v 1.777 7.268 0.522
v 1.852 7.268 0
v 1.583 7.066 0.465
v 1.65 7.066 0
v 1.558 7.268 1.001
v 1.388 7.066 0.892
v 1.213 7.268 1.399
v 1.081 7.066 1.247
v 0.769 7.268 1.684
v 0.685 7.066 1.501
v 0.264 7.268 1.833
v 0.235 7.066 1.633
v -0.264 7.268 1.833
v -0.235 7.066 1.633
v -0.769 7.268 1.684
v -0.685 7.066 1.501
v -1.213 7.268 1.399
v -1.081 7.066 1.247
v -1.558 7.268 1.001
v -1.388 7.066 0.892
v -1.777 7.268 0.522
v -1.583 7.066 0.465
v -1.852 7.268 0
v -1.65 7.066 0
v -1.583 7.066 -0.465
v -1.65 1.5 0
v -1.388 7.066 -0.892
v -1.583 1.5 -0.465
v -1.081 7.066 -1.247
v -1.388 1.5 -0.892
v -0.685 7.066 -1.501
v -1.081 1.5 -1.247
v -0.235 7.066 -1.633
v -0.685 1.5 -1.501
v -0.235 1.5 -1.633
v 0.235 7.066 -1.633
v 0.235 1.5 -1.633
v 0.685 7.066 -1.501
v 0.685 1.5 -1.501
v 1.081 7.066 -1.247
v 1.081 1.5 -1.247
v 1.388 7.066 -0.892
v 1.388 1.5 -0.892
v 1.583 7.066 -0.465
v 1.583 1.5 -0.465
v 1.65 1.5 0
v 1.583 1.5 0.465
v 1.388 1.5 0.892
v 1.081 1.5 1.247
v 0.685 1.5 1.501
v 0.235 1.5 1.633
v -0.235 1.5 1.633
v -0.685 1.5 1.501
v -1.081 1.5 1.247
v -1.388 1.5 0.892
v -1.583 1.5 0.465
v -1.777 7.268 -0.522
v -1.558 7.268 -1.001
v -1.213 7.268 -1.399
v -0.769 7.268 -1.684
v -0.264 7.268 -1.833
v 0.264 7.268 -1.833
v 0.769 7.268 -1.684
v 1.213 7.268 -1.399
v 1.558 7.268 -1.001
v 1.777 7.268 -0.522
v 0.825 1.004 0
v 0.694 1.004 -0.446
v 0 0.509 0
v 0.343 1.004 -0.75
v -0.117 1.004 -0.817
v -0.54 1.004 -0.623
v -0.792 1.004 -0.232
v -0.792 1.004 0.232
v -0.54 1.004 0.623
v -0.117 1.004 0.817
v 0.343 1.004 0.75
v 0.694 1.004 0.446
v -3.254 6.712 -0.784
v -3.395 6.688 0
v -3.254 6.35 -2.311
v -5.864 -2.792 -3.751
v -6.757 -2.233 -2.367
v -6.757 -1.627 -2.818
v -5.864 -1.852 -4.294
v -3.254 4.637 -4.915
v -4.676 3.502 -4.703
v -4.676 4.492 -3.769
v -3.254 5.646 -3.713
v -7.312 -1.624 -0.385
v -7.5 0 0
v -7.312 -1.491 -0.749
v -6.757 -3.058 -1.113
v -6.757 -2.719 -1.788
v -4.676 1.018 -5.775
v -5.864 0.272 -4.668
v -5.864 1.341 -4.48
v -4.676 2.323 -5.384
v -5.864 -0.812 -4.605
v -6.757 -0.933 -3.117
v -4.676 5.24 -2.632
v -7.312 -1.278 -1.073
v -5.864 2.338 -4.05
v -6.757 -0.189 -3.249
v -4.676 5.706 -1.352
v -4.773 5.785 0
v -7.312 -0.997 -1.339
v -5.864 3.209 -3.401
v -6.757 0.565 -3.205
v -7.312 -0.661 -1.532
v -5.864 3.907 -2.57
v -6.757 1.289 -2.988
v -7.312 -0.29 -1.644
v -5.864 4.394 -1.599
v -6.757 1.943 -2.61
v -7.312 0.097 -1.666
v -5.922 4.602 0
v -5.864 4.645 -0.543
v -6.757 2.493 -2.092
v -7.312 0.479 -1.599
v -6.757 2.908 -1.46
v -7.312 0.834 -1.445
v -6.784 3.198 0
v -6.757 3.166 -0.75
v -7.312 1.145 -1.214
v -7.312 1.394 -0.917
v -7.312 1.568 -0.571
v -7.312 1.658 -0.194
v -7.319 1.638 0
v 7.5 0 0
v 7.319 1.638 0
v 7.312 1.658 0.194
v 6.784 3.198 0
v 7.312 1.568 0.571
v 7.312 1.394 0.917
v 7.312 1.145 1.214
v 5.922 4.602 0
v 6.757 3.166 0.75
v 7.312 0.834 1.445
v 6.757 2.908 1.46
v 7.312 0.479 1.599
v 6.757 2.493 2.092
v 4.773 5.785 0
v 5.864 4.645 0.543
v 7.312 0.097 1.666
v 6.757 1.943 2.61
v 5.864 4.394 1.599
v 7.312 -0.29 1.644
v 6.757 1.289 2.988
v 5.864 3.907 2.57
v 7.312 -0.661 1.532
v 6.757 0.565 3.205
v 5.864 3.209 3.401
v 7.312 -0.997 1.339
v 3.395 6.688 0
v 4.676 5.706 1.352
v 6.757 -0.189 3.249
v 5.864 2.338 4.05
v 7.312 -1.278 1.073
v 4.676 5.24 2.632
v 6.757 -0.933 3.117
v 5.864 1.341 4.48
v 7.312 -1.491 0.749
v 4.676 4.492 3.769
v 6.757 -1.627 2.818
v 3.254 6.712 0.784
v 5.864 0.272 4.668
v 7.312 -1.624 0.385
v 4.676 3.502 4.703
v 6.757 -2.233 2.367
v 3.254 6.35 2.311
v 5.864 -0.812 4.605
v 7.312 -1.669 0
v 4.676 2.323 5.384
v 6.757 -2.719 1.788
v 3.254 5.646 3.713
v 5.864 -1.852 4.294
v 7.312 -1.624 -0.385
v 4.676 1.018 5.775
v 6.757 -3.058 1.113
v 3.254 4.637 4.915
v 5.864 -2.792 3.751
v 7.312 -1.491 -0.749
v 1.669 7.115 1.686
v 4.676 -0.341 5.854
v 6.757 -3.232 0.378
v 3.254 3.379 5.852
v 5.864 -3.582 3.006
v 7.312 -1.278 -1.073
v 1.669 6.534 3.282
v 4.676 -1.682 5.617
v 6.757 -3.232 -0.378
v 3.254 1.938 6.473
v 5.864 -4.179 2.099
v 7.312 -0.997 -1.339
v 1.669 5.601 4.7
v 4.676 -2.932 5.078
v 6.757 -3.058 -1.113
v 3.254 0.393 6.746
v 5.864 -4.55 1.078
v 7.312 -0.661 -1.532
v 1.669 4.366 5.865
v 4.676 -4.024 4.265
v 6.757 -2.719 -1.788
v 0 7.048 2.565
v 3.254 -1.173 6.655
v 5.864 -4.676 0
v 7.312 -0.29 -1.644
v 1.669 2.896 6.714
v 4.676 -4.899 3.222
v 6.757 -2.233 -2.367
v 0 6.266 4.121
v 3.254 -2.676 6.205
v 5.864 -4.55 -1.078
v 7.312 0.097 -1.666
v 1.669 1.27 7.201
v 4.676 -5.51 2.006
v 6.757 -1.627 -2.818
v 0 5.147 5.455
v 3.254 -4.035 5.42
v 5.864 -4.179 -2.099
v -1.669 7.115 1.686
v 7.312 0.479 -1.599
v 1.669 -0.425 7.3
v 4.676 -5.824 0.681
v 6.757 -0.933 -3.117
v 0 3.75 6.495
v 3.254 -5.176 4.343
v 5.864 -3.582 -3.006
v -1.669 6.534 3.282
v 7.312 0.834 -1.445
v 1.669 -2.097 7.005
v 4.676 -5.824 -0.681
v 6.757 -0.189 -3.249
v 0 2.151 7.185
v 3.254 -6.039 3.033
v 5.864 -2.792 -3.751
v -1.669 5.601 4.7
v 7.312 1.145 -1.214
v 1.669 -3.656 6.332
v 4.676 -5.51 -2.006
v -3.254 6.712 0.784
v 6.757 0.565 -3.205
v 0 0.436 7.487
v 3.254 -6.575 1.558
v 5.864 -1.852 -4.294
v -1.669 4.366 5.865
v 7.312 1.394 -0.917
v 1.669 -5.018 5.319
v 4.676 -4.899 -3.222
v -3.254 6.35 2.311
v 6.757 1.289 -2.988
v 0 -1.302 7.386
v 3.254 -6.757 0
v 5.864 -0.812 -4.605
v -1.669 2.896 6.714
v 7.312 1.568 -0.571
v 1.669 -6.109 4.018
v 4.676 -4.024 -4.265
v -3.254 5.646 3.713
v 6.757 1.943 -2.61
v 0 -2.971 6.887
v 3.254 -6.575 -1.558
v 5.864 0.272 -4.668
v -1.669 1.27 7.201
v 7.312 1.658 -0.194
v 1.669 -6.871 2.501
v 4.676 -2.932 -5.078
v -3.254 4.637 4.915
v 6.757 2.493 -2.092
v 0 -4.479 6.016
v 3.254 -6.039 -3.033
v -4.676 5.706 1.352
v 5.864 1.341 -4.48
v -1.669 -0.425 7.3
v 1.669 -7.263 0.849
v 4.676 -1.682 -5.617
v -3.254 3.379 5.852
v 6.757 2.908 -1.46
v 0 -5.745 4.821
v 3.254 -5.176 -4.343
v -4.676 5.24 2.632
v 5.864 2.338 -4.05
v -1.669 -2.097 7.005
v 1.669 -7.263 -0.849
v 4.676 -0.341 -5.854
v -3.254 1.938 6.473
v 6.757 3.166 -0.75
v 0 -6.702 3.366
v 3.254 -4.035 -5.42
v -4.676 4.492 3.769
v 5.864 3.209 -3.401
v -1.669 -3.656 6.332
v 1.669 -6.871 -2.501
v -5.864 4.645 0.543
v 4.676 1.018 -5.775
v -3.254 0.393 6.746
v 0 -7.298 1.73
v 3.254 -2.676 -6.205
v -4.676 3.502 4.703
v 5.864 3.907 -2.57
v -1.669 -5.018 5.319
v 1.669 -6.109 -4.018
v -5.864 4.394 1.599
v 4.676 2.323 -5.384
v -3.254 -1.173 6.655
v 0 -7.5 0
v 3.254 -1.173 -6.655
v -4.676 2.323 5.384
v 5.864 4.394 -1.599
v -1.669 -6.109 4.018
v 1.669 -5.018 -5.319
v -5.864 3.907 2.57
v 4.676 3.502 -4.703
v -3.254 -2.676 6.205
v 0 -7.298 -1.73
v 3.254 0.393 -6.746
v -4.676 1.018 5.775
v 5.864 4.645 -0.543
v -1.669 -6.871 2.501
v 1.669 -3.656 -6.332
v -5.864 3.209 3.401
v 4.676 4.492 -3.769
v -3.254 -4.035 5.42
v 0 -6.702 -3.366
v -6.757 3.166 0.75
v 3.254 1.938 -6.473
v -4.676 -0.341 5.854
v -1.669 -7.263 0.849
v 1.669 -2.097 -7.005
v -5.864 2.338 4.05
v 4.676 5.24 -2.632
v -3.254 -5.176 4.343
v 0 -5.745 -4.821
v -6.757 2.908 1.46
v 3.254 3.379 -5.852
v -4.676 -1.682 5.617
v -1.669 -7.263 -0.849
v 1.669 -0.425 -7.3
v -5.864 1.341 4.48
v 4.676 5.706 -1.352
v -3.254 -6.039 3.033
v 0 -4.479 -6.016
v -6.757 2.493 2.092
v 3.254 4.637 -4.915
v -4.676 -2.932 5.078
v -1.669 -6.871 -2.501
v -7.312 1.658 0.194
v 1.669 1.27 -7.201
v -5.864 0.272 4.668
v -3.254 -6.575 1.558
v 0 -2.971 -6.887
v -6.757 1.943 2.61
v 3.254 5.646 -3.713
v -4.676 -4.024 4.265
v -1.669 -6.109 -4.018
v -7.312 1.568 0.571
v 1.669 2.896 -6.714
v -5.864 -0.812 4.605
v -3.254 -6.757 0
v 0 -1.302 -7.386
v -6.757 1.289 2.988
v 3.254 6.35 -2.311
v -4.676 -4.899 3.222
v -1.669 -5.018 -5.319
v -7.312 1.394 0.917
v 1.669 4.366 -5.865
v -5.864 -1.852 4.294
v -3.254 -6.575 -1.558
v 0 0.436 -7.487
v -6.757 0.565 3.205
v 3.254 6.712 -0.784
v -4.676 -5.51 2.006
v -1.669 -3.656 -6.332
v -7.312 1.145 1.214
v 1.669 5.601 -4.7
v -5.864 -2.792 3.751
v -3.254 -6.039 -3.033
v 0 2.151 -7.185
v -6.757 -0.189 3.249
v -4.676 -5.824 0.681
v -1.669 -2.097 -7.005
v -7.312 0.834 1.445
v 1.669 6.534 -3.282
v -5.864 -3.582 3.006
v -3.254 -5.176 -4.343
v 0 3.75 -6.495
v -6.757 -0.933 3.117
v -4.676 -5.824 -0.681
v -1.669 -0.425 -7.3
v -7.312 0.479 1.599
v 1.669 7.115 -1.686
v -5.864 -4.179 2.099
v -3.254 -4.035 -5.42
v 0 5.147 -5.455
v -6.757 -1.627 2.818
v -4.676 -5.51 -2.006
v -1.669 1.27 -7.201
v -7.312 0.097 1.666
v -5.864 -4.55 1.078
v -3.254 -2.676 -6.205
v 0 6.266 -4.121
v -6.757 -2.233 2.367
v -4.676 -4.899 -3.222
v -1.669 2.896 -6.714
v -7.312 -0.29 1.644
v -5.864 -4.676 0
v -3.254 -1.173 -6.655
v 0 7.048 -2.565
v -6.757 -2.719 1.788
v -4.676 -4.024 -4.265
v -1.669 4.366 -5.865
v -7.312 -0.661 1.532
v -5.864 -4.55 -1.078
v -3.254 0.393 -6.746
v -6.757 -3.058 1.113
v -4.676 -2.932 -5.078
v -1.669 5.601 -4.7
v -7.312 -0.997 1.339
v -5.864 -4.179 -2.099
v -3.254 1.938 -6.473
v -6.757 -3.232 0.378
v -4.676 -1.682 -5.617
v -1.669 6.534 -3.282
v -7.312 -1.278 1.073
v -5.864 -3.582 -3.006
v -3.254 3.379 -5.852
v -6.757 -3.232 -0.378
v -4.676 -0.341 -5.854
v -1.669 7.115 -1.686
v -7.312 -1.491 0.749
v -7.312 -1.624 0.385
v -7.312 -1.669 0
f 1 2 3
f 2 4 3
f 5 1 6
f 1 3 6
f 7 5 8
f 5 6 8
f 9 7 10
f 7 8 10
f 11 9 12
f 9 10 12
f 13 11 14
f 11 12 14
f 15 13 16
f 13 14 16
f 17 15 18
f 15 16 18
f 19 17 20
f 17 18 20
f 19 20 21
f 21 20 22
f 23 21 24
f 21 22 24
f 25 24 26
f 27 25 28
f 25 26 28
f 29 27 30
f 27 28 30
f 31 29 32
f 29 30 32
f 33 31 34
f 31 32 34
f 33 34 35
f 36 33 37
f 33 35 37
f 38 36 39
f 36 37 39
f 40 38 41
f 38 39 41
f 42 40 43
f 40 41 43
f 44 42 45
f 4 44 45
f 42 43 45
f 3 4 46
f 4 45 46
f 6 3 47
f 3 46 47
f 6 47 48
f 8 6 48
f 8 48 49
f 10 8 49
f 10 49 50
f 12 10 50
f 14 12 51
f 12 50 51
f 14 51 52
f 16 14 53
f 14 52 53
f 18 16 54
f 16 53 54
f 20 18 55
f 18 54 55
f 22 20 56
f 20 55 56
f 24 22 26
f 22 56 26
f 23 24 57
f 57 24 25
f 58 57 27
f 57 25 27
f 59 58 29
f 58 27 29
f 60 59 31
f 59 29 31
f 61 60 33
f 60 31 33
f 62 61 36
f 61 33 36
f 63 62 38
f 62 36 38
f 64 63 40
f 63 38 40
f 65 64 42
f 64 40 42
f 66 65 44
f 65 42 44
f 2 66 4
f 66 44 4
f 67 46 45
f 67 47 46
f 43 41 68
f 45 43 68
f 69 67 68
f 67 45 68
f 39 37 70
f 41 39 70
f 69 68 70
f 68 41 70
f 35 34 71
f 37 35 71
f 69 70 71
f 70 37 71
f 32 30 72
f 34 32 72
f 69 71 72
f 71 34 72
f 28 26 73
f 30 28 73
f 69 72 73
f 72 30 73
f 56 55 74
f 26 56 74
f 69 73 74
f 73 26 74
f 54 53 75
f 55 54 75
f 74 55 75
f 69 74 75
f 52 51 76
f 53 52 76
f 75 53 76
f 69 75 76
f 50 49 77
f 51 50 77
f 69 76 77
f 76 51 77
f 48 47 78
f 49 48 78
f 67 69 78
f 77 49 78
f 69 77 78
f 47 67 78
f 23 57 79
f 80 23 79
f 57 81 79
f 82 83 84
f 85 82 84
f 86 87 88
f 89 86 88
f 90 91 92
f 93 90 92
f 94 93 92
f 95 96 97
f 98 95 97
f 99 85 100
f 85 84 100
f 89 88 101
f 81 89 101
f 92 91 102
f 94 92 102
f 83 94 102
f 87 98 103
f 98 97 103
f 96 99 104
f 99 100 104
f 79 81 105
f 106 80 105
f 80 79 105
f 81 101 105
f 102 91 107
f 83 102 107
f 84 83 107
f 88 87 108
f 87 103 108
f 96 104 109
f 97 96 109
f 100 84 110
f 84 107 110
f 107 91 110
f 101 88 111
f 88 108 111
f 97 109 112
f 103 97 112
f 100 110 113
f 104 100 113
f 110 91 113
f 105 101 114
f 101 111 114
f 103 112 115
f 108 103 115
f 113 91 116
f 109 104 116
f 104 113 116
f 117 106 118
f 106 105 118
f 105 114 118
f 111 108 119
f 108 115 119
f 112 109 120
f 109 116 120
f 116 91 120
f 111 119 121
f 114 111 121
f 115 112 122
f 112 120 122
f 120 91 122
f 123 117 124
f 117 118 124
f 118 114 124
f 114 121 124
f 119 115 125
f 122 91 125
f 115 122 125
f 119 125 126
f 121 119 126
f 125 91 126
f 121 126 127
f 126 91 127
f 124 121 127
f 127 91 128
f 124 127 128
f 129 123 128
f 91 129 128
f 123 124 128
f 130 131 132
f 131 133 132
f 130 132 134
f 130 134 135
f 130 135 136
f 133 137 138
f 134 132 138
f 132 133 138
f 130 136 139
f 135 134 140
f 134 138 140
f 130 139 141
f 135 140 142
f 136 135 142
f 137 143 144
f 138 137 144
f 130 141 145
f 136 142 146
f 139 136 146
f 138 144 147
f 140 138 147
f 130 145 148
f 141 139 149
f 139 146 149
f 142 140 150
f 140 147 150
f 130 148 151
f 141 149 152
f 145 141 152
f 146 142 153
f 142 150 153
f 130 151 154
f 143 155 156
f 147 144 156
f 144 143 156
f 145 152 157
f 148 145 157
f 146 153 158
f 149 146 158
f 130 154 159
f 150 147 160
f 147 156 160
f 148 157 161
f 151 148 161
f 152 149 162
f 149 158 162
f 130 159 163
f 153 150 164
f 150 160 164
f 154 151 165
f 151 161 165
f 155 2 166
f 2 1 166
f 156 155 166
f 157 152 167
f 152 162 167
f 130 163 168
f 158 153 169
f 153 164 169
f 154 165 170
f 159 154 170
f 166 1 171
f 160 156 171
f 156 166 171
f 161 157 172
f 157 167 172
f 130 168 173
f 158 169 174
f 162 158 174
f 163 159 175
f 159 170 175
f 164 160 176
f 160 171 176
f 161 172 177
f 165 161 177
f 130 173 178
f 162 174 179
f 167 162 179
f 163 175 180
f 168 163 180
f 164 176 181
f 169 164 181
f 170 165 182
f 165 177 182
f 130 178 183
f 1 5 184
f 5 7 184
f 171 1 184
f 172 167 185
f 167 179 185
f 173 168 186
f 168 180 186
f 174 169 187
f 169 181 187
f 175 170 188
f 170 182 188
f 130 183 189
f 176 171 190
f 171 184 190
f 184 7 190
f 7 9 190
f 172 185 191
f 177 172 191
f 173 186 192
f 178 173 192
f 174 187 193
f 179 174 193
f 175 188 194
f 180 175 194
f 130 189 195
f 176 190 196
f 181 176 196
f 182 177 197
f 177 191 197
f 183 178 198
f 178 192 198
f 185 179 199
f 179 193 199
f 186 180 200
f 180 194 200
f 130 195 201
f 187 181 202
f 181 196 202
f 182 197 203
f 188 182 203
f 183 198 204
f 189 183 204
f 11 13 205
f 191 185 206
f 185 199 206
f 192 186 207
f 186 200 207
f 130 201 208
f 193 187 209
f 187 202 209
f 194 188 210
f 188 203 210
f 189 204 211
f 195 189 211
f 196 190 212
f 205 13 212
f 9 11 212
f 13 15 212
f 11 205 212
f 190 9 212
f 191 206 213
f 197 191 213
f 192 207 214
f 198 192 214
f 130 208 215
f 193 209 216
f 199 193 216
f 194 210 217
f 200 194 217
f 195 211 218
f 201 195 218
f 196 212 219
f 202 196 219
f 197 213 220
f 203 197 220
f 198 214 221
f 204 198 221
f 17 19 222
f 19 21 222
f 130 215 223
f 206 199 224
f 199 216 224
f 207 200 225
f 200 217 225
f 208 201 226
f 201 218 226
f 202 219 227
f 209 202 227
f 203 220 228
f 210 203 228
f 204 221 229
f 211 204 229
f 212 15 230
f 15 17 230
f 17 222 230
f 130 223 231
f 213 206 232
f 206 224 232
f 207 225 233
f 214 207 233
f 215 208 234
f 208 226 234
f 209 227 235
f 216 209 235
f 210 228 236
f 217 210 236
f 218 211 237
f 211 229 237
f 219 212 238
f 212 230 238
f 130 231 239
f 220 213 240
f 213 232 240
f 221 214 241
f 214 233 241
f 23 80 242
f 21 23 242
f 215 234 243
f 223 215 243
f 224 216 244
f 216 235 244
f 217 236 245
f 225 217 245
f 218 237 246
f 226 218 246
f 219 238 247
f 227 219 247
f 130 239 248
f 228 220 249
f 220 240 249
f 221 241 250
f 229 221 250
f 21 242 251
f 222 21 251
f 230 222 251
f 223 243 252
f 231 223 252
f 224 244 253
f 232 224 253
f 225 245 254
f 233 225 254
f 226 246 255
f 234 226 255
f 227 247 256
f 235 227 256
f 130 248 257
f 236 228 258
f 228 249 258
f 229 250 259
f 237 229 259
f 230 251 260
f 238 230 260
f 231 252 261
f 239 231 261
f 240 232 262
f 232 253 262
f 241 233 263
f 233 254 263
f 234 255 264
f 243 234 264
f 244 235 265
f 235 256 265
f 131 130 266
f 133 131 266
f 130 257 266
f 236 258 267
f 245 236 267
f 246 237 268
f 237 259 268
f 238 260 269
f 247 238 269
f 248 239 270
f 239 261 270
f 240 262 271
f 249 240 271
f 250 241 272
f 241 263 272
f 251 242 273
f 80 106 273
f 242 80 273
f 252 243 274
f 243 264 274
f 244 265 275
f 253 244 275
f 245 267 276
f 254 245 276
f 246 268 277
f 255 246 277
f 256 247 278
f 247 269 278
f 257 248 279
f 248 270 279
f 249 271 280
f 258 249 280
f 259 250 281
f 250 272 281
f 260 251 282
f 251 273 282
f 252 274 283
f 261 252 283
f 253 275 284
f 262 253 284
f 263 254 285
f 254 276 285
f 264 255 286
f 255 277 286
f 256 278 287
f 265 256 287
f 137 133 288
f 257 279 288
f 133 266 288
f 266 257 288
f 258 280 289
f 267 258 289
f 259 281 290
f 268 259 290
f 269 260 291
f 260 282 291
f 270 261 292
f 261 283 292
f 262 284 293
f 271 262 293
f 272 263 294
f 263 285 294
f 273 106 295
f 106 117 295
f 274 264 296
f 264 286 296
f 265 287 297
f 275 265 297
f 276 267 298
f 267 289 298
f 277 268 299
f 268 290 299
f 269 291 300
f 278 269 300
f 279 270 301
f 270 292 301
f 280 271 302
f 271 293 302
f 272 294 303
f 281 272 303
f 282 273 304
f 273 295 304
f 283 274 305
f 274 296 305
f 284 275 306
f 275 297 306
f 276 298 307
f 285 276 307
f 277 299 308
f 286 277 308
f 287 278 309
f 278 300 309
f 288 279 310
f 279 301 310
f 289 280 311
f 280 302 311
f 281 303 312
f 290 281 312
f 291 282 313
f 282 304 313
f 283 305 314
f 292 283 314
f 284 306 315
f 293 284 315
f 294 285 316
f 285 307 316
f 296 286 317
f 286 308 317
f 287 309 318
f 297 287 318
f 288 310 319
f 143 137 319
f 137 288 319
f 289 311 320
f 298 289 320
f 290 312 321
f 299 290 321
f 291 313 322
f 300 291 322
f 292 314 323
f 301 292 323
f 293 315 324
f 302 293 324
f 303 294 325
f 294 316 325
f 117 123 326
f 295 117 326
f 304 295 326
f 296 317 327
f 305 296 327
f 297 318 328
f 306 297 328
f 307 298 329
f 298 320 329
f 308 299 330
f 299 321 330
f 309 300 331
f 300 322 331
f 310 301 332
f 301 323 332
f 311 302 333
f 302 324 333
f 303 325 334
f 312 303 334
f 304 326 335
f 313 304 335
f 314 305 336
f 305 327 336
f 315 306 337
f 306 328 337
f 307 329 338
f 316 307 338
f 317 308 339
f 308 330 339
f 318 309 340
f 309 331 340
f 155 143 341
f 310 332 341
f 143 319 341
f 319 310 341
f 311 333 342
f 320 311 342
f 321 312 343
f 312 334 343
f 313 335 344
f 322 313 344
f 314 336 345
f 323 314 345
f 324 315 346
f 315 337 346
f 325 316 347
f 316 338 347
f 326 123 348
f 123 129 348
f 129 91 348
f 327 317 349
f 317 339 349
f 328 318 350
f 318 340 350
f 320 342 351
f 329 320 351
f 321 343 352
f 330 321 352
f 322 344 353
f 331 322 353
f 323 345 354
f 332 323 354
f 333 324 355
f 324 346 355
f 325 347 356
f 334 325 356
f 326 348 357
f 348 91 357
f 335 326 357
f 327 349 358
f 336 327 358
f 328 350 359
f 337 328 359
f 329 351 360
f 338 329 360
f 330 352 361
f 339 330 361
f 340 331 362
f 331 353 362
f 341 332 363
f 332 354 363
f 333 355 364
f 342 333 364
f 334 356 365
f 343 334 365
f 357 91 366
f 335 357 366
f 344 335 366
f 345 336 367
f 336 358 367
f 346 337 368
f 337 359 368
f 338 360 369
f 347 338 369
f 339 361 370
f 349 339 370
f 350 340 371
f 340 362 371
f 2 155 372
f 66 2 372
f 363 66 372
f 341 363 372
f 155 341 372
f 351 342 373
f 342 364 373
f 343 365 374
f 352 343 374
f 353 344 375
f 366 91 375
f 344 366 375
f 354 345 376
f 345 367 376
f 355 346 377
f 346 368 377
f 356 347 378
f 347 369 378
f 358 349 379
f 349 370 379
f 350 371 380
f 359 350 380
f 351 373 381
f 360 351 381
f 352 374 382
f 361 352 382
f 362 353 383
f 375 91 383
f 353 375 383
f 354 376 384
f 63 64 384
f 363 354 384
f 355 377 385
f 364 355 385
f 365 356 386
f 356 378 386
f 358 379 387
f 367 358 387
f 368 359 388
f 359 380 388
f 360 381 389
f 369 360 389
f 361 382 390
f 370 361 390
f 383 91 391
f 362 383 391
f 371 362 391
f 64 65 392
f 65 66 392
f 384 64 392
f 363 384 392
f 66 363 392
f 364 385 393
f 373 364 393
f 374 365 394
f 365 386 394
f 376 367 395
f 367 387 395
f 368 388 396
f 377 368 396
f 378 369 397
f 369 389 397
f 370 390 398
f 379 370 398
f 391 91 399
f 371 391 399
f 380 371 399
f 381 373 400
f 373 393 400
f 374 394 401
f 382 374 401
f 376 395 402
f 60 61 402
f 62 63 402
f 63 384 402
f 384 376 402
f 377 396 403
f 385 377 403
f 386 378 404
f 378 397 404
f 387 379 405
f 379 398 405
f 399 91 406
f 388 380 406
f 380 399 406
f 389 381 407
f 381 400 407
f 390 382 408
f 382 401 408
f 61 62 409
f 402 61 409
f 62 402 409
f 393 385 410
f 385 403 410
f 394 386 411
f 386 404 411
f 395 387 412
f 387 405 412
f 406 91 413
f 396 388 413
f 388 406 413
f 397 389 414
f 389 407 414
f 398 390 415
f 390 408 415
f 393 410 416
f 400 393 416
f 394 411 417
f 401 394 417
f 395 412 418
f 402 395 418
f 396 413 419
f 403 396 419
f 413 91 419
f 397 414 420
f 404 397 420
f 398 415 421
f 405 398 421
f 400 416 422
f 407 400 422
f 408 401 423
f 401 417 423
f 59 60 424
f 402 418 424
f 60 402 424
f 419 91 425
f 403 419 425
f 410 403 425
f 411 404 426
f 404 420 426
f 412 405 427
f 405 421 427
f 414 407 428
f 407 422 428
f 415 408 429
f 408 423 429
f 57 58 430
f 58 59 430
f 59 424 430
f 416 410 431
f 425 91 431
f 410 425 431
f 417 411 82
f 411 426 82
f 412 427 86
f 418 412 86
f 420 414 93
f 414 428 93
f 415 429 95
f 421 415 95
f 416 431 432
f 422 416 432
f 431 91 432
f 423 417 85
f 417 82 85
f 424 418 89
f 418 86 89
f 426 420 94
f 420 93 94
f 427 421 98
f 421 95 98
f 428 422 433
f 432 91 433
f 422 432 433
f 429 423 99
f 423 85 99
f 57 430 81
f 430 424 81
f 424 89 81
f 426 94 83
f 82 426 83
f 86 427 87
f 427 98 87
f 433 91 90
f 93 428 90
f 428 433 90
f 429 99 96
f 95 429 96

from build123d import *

# Parameters (mm, degrees)
TAP_DRILL_FOR_M4X0_7_TAP2_D     = 3.3
TAP_DRILL_FOR_M4X0_7_TAP2_DEPTH = 6
TAP_DRILL_FOR_M4X0_7_TAP2_TIP   = 0.991420021


with BuildPart() as part:
    # Sketch2 → Revolve1 (revolve)
    with BuildSketch(Plane.XY):
        with BuildLine():
            Line((-7.5, 0), (7.5, 0))
            ThreePointArc((7.5, 0), (0, 7.5), (-7.5, 0))
        make_face()
    revolve(axis=Axis((-7.5, 0, 0), (1, 0, 0)))

    # Tap Drill for M4x0.7 Tap2
    with Locations(Plane(origin=(0, 7.5, 0), x_dir=(1, 0, 0), z_dir=(0, 1, 0))):
        with Locations((0, 0)):
            Hole(TAP_DRILL_FOR_M4X0_7_TAP2_D / 2, depth=TAP_DRILL_FOR_M4X0_7_TAP2_DEPTH)
            with Locations((0, 0, -(TAP_DRILL_FOR_M4X0_7_TAP2_DEPTH + TAP_DRILL_FOR_M4X0_7_TAP2_TIP / 2))):  # 118° drill point
                Cone(0, TAP_DRILL_FOR_M4X0_7_TAP2_D / 2, TAP_DRILL_FOR_M4X0_7_TAP2_TIP, mode=Mode.SUBTRACT)

    # Chamfer1
    # the kernel refuses this chamfer: 0.25, 0.209117546 mm, written as the material it takes off along each edge
    with BuildSketch(Plane(origin=(-1e-09, 7.316249039, -3e-09), x_dir=(-1.0, 0, 1.5237922439259502e-09), z_dir=(1.5237922439259502e-09, 0, 1.0))) as chamfer1_piece_1:
        with BuildLine():
            Line((1.851597136, 0.048402863), (1.649999997, 0.250000002))
            Line((1.649999997, 0.250000002), (1.649999999, 0))
            ThreePointArc((1.649999999, 0), (1.75350475, 0.024114846), (1.851597136, 0.048402863))
        make_face()
    revolve(axis=Axis((-1e-09, 7.316249039, -3e-09), (0, -1, 0)), revolution_arc=180.000000175, mode=Mode.SUBTRACT)
    with BuildSketch(Plane(origin=(0, 7.316249039, 3e-09), x_dir=(1.0, 0, -1.755349969310666e-09), z_dir=(-1.755349969310666e-09, 0, -1.0))) as chamfer1_piece_2:
        with BuildLine():
            Line((1.851597137, 0.048402863), (1.649999997, 0.250000003))
            Line((1.649999997, 0.250000003), (1.65, 0))
            ThreePointArc((1.65, 0), (1.75350475, 0.024114847), (1.851597137, 0.048402863))
        make_face()
    revolve(axis=Axis((0, 7.316249039, 3e-09), (0, -1, 0)), revolution_arc=180.000000201, mode=Mode.SUBTRACT)


solid = part.part
